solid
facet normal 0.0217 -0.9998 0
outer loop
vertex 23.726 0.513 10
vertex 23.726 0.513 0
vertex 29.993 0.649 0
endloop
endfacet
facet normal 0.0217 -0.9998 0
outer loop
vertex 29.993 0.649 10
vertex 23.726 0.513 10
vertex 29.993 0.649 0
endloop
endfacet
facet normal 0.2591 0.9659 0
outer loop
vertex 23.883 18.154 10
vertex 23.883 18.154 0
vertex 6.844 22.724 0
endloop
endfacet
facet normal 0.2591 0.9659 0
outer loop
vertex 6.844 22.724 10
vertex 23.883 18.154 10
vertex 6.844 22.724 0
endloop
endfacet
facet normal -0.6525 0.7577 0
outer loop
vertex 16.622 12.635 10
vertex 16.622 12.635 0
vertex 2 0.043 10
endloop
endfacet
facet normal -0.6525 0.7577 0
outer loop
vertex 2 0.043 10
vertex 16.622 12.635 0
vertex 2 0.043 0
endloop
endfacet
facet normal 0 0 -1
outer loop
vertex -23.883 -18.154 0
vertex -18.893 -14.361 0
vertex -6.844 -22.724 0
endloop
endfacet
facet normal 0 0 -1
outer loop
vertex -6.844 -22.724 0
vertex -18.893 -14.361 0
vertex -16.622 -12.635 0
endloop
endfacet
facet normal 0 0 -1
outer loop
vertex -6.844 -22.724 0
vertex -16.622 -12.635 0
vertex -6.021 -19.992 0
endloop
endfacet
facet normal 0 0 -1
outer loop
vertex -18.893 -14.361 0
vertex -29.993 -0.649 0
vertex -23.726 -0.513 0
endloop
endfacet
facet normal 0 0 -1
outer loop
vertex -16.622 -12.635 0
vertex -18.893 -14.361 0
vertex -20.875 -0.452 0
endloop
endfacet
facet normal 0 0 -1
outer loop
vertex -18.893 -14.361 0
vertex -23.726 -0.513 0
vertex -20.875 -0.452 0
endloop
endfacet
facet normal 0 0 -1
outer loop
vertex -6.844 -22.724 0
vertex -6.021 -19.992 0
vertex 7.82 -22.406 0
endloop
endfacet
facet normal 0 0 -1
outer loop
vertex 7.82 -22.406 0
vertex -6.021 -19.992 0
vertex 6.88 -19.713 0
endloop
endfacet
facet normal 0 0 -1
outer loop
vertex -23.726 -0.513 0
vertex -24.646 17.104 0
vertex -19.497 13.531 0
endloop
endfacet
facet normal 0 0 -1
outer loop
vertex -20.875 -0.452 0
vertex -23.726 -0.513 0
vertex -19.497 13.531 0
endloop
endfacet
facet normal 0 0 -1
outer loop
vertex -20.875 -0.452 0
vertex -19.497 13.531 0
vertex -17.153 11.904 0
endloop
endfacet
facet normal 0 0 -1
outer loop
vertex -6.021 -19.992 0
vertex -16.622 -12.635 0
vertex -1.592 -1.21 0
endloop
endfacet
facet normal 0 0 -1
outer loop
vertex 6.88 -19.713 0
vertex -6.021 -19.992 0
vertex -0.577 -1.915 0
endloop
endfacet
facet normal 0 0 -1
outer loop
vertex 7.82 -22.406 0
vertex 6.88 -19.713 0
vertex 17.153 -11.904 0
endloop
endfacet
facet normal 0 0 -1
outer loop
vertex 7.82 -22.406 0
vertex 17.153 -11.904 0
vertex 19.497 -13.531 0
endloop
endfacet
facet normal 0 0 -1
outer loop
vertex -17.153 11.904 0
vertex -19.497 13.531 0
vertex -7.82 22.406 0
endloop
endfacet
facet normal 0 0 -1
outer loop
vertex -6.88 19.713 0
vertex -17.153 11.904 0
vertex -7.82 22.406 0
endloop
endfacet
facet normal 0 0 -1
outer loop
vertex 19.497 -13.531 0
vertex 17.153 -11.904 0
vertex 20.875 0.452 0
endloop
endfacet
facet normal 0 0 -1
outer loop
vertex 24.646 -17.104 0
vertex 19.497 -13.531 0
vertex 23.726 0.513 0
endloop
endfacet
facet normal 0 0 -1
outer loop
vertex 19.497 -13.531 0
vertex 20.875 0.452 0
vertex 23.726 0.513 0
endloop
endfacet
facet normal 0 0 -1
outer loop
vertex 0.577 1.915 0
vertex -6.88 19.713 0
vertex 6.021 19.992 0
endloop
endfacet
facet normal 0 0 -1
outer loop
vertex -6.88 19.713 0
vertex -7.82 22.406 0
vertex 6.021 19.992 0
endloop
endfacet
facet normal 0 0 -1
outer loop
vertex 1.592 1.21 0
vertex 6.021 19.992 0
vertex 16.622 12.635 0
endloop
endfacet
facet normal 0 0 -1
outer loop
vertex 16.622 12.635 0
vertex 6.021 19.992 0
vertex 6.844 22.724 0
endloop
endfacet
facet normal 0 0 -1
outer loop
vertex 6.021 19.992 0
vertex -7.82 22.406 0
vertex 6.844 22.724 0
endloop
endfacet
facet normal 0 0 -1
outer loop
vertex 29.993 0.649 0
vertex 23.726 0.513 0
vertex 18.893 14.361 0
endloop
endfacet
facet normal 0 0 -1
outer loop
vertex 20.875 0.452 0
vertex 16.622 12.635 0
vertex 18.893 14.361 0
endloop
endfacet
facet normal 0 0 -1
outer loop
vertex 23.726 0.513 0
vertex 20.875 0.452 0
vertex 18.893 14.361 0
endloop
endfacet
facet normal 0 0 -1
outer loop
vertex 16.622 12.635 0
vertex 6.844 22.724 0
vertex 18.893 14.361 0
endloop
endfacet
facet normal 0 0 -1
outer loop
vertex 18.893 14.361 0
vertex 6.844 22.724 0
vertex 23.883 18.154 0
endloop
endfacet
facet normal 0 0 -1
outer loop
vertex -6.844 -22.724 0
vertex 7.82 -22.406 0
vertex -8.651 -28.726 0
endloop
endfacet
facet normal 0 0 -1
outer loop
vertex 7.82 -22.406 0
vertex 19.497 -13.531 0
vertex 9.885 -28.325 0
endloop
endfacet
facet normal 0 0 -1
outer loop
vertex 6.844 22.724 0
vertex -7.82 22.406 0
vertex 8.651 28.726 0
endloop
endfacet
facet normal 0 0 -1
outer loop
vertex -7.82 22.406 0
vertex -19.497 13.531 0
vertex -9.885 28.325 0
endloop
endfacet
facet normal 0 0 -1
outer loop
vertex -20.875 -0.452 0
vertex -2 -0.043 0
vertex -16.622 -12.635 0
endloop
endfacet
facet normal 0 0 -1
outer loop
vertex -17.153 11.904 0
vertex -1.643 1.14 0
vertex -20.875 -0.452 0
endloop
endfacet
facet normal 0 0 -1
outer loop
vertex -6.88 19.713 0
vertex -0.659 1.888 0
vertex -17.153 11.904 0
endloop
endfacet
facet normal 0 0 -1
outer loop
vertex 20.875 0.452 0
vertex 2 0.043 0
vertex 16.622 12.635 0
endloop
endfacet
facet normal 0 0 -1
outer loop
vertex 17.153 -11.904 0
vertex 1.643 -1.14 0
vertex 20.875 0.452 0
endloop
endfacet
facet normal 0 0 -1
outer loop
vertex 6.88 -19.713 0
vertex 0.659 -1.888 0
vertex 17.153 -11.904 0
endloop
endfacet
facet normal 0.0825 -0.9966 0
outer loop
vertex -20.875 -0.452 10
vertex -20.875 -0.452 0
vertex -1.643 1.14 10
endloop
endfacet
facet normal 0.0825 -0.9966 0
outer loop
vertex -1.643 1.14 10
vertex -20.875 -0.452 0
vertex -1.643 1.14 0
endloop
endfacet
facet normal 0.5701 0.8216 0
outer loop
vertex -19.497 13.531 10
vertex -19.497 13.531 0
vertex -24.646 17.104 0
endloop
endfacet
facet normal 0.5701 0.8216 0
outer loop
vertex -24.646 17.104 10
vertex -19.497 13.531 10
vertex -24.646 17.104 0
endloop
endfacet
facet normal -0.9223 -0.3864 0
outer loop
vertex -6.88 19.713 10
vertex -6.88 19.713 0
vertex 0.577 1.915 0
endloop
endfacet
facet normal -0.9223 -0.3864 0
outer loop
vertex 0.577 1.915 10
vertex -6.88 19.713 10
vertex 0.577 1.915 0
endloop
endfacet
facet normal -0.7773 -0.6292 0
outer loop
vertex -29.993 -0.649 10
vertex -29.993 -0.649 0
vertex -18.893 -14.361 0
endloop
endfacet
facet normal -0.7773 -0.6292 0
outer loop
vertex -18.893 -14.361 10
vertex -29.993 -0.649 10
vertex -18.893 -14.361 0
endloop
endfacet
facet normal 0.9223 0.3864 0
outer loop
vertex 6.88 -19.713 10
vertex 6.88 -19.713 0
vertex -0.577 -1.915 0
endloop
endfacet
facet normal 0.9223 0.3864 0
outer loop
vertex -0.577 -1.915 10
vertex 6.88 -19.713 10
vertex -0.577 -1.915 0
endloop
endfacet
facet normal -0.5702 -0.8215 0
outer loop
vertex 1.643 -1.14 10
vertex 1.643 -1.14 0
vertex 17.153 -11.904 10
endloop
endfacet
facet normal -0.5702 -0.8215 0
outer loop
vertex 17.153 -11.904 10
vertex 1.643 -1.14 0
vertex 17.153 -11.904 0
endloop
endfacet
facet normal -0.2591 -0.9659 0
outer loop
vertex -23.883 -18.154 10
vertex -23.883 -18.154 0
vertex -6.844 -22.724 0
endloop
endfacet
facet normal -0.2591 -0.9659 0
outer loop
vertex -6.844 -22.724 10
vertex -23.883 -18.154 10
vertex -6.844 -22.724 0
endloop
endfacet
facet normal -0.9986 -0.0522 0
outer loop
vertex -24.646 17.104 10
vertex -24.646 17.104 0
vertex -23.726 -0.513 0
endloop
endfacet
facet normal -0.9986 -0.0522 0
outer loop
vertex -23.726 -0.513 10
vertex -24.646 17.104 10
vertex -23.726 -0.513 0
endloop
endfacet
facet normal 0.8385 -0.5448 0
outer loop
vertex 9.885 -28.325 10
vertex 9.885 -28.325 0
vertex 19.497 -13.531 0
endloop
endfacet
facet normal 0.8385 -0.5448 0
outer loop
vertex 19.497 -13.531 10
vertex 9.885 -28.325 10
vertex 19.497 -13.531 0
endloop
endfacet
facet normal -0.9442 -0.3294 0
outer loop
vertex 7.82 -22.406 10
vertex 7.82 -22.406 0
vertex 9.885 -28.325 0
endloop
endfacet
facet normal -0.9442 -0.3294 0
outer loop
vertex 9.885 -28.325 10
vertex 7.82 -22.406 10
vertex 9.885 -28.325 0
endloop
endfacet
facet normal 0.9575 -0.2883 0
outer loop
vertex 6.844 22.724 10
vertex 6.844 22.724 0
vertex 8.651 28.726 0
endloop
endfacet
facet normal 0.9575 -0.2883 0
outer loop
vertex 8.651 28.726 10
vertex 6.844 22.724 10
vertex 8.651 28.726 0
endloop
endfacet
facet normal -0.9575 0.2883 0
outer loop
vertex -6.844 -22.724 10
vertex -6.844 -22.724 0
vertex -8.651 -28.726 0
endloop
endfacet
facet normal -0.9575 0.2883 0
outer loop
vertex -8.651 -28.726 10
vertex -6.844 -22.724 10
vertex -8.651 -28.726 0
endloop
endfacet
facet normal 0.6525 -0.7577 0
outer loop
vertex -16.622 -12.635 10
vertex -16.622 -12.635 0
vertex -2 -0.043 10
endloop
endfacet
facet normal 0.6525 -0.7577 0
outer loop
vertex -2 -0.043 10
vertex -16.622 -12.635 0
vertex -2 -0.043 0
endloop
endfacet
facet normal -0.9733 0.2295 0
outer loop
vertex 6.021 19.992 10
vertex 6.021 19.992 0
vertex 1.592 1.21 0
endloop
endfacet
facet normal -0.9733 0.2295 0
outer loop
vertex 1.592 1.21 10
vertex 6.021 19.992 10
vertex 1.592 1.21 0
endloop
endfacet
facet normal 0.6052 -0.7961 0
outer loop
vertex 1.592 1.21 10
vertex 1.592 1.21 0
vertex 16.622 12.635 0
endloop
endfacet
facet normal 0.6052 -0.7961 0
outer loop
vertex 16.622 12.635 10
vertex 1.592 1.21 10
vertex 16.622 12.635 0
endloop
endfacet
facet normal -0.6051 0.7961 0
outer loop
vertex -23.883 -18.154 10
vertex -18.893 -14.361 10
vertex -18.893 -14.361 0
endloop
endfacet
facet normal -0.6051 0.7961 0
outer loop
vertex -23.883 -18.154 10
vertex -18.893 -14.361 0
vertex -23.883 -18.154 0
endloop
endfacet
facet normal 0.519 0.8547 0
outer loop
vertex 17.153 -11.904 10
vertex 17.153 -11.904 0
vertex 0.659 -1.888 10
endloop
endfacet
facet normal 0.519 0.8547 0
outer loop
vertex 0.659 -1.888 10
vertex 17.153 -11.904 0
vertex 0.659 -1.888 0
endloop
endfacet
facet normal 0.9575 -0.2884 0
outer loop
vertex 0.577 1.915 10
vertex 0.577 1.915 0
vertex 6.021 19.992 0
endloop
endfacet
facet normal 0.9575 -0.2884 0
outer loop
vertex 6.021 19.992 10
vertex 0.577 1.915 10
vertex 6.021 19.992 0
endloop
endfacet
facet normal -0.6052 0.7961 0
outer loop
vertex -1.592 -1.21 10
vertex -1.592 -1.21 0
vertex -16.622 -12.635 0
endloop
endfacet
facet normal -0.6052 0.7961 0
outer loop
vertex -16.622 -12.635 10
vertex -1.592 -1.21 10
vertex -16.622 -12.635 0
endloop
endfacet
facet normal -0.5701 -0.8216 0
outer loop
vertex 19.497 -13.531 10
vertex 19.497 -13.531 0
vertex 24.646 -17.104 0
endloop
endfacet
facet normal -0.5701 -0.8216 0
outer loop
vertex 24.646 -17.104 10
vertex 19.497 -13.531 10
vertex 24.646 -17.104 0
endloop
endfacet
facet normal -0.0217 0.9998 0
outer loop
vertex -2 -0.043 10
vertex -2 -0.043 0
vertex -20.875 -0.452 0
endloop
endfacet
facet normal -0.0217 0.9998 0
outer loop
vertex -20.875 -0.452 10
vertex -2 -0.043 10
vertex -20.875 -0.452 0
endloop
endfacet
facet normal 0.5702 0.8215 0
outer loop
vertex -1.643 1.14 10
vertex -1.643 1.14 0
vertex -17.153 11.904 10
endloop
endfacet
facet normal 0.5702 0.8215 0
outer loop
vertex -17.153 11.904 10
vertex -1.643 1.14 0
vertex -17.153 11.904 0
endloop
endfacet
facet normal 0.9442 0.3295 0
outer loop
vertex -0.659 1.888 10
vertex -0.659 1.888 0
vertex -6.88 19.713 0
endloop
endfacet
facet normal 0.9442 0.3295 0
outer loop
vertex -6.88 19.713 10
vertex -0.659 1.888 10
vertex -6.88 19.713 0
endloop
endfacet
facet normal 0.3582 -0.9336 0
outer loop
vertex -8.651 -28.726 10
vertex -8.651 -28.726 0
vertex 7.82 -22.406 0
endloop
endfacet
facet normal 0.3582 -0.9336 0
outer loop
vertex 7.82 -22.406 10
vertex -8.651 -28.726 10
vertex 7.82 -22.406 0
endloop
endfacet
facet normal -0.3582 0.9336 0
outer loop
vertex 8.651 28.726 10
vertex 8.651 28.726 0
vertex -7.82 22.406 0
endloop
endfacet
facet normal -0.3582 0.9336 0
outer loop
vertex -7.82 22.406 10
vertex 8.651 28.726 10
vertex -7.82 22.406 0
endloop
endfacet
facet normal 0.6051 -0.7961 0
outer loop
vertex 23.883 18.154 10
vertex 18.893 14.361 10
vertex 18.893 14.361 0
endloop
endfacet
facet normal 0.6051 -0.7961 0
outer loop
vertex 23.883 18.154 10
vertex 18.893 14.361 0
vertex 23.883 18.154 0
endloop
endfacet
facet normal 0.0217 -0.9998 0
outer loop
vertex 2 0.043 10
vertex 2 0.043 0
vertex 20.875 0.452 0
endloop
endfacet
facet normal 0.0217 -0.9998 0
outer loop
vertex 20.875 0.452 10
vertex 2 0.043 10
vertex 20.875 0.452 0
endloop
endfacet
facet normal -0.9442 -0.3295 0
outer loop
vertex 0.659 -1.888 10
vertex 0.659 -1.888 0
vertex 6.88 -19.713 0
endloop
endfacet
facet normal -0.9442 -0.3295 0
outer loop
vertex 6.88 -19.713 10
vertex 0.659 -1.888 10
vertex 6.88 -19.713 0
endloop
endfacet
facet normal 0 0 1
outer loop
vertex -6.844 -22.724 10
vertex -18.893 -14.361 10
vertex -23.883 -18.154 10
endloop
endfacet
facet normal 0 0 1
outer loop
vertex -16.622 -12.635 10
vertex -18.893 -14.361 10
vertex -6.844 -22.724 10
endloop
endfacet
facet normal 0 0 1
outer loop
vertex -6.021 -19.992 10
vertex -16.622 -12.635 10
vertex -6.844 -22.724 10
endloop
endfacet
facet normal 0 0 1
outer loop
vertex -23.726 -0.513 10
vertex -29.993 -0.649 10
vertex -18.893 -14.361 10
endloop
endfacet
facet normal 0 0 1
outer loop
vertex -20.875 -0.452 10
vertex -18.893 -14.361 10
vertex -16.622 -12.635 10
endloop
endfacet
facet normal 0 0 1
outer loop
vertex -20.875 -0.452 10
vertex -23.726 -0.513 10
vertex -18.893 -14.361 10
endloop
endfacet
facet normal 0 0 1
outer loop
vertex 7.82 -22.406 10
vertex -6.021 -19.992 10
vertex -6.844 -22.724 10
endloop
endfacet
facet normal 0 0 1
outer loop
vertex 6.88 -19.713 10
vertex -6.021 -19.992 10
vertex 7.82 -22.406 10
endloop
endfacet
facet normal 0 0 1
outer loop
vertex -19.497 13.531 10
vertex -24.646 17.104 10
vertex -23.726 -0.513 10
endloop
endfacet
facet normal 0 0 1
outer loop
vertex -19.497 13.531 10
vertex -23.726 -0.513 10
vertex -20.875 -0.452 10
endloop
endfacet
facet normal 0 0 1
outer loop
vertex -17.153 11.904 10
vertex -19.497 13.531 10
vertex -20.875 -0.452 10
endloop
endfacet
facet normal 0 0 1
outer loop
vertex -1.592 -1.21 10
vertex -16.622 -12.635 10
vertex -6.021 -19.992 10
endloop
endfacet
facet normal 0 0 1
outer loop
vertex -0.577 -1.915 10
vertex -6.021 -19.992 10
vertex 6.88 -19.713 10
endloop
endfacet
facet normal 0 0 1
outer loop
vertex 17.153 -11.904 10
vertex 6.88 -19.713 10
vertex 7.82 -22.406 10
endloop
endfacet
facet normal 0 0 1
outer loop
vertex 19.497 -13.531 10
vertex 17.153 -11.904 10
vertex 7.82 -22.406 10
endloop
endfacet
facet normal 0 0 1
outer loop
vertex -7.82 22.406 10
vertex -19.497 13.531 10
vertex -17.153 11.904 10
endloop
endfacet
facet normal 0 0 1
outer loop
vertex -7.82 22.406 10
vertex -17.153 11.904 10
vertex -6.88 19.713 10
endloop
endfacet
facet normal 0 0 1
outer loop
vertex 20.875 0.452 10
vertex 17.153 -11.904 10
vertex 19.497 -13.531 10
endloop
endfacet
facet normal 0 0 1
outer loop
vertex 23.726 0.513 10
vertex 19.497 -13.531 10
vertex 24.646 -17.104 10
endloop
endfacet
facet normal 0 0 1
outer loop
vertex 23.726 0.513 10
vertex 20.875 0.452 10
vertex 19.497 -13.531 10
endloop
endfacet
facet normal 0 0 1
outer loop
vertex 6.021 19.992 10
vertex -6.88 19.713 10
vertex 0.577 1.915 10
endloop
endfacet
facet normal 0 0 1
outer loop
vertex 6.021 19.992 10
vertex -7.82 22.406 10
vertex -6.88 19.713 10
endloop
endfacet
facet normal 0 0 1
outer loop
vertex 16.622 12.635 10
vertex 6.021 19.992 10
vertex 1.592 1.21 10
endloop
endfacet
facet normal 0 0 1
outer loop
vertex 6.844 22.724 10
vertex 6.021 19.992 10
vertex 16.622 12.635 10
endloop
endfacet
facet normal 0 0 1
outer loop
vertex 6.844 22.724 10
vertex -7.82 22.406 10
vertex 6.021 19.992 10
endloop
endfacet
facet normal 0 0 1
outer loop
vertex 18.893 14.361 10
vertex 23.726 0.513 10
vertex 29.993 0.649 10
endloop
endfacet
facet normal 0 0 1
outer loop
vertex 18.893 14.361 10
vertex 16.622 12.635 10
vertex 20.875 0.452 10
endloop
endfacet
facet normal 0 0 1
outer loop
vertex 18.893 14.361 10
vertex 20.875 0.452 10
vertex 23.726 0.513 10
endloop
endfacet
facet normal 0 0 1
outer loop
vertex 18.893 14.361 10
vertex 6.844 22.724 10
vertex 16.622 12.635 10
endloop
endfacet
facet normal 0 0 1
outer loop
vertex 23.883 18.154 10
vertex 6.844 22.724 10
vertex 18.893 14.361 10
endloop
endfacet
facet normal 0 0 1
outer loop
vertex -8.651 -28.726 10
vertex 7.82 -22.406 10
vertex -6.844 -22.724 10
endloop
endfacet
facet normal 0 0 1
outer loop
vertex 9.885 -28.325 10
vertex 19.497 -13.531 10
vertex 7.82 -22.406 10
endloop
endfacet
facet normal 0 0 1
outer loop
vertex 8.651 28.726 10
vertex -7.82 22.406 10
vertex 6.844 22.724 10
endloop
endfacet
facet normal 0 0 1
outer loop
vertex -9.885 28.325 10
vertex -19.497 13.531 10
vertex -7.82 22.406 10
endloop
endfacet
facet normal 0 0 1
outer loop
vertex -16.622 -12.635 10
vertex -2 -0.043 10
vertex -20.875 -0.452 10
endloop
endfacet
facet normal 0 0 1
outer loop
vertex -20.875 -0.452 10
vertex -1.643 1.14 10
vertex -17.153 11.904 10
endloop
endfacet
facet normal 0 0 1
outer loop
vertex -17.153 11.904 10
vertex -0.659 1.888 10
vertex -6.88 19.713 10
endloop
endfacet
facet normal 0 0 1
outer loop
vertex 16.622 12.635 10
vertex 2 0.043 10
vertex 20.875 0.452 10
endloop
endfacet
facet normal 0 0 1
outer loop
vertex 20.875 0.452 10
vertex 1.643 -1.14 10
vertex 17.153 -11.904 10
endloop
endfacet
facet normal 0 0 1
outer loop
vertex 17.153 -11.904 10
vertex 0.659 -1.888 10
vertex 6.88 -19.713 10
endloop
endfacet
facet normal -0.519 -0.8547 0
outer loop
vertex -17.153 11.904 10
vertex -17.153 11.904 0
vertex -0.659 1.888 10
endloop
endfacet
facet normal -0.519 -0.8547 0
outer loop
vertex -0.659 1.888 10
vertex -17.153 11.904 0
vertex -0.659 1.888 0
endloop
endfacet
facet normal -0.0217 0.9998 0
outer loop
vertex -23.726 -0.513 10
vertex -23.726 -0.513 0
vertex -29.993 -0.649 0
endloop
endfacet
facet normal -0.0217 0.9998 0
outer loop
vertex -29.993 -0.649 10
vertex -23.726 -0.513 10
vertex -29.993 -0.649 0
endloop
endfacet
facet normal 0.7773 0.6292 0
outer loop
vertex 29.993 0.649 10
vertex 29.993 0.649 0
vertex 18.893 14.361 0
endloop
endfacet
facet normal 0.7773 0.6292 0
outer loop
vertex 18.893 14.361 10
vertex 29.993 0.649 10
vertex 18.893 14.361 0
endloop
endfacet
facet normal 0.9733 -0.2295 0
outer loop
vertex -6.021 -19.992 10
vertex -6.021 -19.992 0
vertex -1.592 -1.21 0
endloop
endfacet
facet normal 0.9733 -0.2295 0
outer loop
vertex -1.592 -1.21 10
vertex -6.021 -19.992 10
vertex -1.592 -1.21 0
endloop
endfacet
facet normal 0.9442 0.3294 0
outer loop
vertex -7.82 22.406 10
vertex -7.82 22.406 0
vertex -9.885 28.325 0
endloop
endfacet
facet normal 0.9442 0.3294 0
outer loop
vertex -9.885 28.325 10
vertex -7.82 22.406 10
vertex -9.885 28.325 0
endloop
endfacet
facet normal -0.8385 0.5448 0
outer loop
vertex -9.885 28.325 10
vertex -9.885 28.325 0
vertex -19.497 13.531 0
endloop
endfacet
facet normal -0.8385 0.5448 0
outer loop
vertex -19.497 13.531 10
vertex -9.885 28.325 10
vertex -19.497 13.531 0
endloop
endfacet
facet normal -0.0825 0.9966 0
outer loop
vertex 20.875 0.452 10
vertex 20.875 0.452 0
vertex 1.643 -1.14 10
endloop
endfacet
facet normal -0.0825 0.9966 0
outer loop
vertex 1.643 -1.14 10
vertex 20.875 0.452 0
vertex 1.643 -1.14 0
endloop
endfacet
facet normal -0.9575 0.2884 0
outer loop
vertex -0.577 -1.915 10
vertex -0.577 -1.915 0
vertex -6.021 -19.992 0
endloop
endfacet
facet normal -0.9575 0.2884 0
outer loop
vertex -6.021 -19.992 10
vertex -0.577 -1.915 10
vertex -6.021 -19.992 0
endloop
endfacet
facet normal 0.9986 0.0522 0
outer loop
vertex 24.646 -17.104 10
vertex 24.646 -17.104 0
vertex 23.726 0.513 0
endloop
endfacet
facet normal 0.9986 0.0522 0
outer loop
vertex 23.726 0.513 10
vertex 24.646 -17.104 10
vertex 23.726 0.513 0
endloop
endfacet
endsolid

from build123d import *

# Parameters (mm, degrees)
F2_DEPTH = 10


with BuildPart() as f2:
    # F1 (on Top) → F2 (new body)
    with BuildSketch(Plane.XY):
        Polygon((-23.7262713233, -0.5133114427), (-29.9929815414, -0.6488900181), (-18.8932398178, -14.3612300563), (-16.6224315579, -12.6351311898), (-1.9995321028, -0.0432593345), (-20.8745733923, -0.4516157317), align=None)
        Polygon((-24.646239762, 17.1044691702), (-23.7262713233, -0.5133114427), (-20.8745733923, -0.4516157317), (-1.6430826508, 1.1402979447), (-17.1533376915, 11.904401586), (-19.4966736096, 13.5306746951), align=None)
        Polygon((-9.8854720883, 28.324502495), (-19.4966736096, 13.5306746951), (-17.1533376915, 11.904401586), (-0.6590314726, 1.8883001663), (-6.8801100131, 19.7133421136), (-7.8200092446, 22.4064029902), align=None)
        Polygon((8.6512099282, 28.7255385812), (-7.8200092446, 22.4064029902), (-6.8801100131, 19.7133421136), (0.5767473285, 1.9150359054), (6.021085844, 19.9924559857), (6.8436328595, 22.7236469086), align=None)
        Polygon((23.883423796, 18.1543952744), (6.8436328595, 22.7236469086), (6.021085844, 19.9924559857), (1.5922282531, 1.2102930183), (16.6224315579, 12.6351311898), (18.8932398178, 14.3612300563), align=None)
        Polygon((20.8745733923, 0.4516157317), (23.7262713233, 0.5133114427), (29.9929815414, 0.6488900181), (18.8932398178, 14.3612300563), (16.6224315579, 12.6351311898), (1.9995321028, 0.0432593345), align=None)
        Polygon((17.1533376915, -11.904401586), (19.4966736096, -13.5306746951), (24.646239762, -17.1044691702), (23.7262713233, 0.5133114427), (20.8745733923, 0.4516157317), (1.6430826508, -1.1402979447), align=None)
        Polygon((6.8801100131, -19.7133421136), (7.8200092446, -22.4064029902), (9.8854720883, -28.324502495), (19.4966736096, -13.5306746951), (17.1533376915, -11.904401586), (0.6590314726, -1.8883001663), align=None)
        Polygon((-6.021085844, -19.9924559857), (-6.8436328595, -22.7236469086), (-8.6512099282, -28.7255385812), (7.8200092446, -22.4064029902), (6.8801100131, -19.7133421136), (-0.5767473285, -1.9150359054), align=None)
        Polygon((-16.6224315579, -12.6351311898), (-18.8932398178, -14.3612300563), (-23.883423796, -18.1543952744), (-6.8436328595, -22.7236469086), (-6.021085844, -19.9924559857), (-1.5922282531, -1.2102930183), align=None)
    extrude(amount=F2_DEPTH)


solid = f2.part
